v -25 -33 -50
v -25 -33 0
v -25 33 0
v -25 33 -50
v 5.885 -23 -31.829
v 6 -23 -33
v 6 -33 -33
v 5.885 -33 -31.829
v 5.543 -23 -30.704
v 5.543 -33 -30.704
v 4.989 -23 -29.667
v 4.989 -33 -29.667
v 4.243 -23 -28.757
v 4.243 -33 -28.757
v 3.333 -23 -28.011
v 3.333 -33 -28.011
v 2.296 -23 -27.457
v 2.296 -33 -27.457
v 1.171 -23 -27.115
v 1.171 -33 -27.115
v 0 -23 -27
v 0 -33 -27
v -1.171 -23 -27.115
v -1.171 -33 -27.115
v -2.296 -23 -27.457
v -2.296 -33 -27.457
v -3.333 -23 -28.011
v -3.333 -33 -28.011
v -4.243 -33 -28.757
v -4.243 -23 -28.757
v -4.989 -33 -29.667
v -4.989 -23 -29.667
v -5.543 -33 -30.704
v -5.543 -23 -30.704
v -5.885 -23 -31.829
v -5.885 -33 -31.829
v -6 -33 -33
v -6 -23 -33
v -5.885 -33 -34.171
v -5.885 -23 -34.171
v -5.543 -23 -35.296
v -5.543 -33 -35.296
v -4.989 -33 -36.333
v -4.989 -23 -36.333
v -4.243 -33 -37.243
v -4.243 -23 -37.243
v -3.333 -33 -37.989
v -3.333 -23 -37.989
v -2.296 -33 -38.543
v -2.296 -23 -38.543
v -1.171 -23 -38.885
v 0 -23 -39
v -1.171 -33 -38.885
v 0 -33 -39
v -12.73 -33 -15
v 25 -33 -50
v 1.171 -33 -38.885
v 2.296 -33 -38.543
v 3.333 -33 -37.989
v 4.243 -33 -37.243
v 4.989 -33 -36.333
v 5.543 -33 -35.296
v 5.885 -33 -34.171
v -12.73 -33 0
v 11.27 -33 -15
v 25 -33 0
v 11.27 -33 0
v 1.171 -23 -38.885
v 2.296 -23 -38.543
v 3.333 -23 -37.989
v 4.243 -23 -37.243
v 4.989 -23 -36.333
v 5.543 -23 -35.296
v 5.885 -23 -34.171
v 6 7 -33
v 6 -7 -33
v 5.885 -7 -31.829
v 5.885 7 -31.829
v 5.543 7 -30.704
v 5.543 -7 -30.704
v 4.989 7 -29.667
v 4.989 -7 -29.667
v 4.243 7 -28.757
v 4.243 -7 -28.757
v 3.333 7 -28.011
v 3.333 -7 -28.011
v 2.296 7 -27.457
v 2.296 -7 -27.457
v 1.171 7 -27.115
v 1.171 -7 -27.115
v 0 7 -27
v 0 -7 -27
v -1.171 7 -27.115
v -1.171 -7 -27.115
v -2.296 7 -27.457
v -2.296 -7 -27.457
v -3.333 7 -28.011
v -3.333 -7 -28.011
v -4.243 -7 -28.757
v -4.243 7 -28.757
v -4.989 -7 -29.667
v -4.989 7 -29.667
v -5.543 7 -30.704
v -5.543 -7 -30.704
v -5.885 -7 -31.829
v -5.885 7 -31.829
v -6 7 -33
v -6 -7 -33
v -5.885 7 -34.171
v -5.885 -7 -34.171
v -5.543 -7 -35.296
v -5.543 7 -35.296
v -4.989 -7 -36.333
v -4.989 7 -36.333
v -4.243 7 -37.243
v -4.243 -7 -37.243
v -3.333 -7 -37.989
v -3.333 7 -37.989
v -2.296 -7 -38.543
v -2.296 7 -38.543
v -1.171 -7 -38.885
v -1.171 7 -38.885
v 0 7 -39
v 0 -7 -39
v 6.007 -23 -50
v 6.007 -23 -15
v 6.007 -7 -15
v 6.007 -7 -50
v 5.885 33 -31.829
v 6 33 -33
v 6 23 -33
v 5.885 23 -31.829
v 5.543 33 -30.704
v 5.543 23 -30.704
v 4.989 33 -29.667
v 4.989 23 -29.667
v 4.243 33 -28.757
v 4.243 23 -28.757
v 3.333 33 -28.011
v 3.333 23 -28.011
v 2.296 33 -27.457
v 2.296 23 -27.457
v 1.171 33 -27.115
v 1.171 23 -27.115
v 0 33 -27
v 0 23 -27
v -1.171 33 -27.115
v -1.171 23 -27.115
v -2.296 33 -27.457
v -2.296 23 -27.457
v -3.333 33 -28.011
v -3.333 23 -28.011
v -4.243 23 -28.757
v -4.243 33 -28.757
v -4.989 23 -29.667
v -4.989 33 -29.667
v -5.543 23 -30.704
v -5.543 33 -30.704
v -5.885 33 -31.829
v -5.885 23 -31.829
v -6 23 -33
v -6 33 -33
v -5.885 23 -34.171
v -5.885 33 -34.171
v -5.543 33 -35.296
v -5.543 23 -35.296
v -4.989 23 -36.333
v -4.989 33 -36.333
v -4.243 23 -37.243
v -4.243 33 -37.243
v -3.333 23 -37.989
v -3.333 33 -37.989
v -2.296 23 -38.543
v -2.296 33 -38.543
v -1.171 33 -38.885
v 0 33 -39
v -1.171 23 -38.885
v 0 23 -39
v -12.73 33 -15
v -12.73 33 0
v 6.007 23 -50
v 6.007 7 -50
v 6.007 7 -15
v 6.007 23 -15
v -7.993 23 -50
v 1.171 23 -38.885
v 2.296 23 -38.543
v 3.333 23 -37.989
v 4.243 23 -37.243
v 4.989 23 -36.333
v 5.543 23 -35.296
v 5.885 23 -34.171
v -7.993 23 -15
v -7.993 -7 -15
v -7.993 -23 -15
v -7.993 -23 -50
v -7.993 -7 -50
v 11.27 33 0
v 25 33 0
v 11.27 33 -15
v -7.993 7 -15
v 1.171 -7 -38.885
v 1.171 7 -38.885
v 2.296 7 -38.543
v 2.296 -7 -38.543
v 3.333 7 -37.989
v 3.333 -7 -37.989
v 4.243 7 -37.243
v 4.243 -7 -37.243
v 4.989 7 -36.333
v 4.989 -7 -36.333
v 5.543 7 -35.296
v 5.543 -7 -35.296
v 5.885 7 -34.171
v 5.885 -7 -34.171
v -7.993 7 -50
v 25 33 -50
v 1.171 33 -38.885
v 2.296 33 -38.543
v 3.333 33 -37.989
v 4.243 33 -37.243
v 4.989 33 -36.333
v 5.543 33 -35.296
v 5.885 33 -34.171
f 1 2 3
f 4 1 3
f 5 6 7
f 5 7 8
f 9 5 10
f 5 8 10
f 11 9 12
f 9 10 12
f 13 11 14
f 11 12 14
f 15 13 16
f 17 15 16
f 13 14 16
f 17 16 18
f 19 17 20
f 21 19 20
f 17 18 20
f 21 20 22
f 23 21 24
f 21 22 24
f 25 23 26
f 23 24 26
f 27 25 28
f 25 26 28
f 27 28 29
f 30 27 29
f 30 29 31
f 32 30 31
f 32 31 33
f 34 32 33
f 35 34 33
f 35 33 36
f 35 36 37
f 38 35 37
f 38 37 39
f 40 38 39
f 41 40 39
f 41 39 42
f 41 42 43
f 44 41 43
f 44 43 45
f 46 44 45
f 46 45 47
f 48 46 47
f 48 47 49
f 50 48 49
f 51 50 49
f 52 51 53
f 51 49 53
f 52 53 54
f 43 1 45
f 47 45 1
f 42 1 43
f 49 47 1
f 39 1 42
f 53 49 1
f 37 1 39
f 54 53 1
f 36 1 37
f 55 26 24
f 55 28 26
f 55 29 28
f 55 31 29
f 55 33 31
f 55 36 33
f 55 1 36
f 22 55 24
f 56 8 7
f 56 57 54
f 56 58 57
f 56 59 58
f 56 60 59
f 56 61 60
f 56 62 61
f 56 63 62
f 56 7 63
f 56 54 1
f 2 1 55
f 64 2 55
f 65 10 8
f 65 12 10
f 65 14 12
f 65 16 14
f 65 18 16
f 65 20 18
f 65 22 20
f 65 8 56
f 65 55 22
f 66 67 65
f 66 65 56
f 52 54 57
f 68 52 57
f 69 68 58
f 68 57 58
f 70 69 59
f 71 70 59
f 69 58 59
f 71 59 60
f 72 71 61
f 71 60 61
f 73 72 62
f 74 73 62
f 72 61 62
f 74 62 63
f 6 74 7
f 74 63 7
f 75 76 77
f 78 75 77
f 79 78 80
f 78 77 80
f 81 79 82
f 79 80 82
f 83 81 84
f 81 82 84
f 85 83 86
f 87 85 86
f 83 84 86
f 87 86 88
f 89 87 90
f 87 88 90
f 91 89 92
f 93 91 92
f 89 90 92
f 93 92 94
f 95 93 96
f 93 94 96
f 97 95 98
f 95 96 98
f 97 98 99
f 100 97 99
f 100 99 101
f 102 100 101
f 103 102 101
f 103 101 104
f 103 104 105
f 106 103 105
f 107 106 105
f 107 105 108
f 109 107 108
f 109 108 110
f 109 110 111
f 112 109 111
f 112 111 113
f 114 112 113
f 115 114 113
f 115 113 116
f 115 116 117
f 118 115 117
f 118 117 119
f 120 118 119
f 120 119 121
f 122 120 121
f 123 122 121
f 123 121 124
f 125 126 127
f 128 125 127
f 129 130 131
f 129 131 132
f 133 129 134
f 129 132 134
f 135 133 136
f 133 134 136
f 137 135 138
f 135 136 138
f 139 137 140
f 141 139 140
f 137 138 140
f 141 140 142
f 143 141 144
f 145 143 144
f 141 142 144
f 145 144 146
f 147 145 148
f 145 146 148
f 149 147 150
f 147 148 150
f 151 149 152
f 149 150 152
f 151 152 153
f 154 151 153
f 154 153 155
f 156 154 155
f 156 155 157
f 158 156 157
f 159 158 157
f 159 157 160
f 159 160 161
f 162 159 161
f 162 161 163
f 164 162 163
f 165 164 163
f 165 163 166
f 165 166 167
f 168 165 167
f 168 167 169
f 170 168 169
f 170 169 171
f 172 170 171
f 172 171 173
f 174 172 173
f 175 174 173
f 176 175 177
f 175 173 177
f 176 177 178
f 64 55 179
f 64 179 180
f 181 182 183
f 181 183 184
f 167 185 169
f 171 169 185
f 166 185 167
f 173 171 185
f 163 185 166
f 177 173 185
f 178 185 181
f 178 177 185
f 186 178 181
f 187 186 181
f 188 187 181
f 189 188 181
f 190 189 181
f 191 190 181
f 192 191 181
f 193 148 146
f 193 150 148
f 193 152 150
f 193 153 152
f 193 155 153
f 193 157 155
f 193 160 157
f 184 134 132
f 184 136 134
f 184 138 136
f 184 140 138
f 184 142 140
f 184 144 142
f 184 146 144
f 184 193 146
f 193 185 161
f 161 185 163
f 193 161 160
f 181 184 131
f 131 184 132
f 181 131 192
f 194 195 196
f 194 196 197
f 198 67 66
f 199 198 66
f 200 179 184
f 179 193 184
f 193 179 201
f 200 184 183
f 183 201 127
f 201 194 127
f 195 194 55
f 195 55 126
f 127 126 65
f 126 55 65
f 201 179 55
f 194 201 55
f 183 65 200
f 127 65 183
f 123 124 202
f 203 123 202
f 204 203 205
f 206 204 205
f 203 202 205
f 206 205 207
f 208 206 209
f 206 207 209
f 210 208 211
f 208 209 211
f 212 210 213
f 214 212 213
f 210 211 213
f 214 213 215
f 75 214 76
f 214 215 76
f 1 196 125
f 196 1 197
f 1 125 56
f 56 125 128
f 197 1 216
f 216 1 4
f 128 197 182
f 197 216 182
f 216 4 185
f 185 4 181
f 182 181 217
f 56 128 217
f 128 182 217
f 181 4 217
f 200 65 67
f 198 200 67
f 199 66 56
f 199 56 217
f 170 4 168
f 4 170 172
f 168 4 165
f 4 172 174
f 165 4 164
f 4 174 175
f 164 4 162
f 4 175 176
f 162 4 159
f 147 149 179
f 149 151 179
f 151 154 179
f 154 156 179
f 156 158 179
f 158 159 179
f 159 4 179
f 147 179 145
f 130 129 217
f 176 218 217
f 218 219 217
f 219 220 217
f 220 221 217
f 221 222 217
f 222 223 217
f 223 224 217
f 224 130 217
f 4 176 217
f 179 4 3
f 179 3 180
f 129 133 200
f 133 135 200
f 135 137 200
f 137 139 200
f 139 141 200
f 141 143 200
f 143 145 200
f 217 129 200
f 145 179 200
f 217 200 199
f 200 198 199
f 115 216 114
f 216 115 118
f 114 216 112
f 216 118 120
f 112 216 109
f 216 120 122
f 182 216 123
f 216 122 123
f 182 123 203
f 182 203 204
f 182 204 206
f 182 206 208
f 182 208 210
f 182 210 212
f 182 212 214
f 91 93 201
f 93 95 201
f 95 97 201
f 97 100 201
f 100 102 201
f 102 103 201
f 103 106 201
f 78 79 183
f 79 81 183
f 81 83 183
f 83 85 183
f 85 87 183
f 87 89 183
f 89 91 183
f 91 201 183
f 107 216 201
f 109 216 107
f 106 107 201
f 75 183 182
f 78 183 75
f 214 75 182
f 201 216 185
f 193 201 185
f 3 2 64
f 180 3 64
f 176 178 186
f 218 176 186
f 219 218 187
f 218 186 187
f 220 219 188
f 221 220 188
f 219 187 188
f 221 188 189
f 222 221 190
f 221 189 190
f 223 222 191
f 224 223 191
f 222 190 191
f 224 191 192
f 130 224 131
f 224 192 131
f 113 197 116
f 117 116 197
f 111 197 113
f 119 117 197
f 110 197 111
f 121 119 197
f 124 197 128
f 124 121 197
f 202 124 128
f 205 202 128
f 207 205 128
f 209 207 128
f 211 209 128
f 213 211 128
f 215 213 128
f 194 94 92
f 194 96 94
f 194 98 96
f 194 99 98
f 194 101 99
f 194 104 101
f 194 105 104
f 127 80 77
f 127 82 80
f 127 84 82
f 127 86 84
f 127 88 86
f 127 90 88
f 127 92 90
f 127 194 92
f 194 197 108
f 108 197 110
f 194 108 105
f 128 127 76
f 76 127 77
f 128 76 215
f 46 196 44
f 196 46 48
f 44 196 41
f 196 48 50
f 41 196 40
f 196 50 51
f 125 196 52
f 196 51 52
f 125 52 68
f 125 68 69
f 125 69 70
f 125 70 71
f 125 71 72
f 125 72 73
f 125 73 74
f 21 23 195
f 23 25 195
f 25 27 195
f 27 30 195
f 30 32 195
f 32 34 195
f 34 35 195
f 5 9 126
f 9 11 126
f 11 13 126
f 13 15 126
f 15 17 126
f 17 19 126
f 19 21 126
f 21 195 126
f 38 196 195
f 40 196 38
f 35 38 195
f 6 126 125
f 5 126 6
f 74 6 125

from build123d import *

# Parameters (mm, degrees)
F0_W     = 50
F0_H     = 66
F1_DEPTH = 50
F2_W     = 24
F2_H     = 15
F3_DEPTH = 100
F5_DEPTH = 100
F6_W     = 14
F6_H     = 16
F7_DEPTH = 100


with BuildPart() as f1:
    # F0 (on Top) → F1 (new body)
    with BuildSketch(Plane.XY):
        Rectangle(F0_W, F0_H)
    extrude(amount=-F1_DEPTH)

    # F2 (on face) → F3 (cut)
    with BuildSketch(Plane.XZ.offset(33)):
        with Locations((-0.730263, -7.5)):
            Rectangle(F2_W, F2_H)
    extrude(amount=-F3_DEPTH, mode=Mode.SUBTRACT)

    # F4 (on face) → F5 (cut)
    with BuildSketch(Plane.XZ.offset(33)):
        with BuildLine():
            ThreePointArc((6, -33), (-4.242641, -28.757359), (0, -39))
            ThreePointArc((0, -39), (4.242641, -37.242641), (6, -33))
        make_face()
    extrude(amount=-F5_DEPTH, mode=Mode.SUBTRACT)

    # F6 (on face) → F7 (cut)
    with BuildSketch(Plane.XY.offset(-15)):
        with Locations((-0.993422, 15)):
            Rectangle(F6_W, F6_H)
        with Locations((-0.993422, -15)):
            Rectangle(F6_W, F6_H)
    extrude(amount=-F7_DEPTH, mode=Mode.SUBTRACT)


solid = f1.part
